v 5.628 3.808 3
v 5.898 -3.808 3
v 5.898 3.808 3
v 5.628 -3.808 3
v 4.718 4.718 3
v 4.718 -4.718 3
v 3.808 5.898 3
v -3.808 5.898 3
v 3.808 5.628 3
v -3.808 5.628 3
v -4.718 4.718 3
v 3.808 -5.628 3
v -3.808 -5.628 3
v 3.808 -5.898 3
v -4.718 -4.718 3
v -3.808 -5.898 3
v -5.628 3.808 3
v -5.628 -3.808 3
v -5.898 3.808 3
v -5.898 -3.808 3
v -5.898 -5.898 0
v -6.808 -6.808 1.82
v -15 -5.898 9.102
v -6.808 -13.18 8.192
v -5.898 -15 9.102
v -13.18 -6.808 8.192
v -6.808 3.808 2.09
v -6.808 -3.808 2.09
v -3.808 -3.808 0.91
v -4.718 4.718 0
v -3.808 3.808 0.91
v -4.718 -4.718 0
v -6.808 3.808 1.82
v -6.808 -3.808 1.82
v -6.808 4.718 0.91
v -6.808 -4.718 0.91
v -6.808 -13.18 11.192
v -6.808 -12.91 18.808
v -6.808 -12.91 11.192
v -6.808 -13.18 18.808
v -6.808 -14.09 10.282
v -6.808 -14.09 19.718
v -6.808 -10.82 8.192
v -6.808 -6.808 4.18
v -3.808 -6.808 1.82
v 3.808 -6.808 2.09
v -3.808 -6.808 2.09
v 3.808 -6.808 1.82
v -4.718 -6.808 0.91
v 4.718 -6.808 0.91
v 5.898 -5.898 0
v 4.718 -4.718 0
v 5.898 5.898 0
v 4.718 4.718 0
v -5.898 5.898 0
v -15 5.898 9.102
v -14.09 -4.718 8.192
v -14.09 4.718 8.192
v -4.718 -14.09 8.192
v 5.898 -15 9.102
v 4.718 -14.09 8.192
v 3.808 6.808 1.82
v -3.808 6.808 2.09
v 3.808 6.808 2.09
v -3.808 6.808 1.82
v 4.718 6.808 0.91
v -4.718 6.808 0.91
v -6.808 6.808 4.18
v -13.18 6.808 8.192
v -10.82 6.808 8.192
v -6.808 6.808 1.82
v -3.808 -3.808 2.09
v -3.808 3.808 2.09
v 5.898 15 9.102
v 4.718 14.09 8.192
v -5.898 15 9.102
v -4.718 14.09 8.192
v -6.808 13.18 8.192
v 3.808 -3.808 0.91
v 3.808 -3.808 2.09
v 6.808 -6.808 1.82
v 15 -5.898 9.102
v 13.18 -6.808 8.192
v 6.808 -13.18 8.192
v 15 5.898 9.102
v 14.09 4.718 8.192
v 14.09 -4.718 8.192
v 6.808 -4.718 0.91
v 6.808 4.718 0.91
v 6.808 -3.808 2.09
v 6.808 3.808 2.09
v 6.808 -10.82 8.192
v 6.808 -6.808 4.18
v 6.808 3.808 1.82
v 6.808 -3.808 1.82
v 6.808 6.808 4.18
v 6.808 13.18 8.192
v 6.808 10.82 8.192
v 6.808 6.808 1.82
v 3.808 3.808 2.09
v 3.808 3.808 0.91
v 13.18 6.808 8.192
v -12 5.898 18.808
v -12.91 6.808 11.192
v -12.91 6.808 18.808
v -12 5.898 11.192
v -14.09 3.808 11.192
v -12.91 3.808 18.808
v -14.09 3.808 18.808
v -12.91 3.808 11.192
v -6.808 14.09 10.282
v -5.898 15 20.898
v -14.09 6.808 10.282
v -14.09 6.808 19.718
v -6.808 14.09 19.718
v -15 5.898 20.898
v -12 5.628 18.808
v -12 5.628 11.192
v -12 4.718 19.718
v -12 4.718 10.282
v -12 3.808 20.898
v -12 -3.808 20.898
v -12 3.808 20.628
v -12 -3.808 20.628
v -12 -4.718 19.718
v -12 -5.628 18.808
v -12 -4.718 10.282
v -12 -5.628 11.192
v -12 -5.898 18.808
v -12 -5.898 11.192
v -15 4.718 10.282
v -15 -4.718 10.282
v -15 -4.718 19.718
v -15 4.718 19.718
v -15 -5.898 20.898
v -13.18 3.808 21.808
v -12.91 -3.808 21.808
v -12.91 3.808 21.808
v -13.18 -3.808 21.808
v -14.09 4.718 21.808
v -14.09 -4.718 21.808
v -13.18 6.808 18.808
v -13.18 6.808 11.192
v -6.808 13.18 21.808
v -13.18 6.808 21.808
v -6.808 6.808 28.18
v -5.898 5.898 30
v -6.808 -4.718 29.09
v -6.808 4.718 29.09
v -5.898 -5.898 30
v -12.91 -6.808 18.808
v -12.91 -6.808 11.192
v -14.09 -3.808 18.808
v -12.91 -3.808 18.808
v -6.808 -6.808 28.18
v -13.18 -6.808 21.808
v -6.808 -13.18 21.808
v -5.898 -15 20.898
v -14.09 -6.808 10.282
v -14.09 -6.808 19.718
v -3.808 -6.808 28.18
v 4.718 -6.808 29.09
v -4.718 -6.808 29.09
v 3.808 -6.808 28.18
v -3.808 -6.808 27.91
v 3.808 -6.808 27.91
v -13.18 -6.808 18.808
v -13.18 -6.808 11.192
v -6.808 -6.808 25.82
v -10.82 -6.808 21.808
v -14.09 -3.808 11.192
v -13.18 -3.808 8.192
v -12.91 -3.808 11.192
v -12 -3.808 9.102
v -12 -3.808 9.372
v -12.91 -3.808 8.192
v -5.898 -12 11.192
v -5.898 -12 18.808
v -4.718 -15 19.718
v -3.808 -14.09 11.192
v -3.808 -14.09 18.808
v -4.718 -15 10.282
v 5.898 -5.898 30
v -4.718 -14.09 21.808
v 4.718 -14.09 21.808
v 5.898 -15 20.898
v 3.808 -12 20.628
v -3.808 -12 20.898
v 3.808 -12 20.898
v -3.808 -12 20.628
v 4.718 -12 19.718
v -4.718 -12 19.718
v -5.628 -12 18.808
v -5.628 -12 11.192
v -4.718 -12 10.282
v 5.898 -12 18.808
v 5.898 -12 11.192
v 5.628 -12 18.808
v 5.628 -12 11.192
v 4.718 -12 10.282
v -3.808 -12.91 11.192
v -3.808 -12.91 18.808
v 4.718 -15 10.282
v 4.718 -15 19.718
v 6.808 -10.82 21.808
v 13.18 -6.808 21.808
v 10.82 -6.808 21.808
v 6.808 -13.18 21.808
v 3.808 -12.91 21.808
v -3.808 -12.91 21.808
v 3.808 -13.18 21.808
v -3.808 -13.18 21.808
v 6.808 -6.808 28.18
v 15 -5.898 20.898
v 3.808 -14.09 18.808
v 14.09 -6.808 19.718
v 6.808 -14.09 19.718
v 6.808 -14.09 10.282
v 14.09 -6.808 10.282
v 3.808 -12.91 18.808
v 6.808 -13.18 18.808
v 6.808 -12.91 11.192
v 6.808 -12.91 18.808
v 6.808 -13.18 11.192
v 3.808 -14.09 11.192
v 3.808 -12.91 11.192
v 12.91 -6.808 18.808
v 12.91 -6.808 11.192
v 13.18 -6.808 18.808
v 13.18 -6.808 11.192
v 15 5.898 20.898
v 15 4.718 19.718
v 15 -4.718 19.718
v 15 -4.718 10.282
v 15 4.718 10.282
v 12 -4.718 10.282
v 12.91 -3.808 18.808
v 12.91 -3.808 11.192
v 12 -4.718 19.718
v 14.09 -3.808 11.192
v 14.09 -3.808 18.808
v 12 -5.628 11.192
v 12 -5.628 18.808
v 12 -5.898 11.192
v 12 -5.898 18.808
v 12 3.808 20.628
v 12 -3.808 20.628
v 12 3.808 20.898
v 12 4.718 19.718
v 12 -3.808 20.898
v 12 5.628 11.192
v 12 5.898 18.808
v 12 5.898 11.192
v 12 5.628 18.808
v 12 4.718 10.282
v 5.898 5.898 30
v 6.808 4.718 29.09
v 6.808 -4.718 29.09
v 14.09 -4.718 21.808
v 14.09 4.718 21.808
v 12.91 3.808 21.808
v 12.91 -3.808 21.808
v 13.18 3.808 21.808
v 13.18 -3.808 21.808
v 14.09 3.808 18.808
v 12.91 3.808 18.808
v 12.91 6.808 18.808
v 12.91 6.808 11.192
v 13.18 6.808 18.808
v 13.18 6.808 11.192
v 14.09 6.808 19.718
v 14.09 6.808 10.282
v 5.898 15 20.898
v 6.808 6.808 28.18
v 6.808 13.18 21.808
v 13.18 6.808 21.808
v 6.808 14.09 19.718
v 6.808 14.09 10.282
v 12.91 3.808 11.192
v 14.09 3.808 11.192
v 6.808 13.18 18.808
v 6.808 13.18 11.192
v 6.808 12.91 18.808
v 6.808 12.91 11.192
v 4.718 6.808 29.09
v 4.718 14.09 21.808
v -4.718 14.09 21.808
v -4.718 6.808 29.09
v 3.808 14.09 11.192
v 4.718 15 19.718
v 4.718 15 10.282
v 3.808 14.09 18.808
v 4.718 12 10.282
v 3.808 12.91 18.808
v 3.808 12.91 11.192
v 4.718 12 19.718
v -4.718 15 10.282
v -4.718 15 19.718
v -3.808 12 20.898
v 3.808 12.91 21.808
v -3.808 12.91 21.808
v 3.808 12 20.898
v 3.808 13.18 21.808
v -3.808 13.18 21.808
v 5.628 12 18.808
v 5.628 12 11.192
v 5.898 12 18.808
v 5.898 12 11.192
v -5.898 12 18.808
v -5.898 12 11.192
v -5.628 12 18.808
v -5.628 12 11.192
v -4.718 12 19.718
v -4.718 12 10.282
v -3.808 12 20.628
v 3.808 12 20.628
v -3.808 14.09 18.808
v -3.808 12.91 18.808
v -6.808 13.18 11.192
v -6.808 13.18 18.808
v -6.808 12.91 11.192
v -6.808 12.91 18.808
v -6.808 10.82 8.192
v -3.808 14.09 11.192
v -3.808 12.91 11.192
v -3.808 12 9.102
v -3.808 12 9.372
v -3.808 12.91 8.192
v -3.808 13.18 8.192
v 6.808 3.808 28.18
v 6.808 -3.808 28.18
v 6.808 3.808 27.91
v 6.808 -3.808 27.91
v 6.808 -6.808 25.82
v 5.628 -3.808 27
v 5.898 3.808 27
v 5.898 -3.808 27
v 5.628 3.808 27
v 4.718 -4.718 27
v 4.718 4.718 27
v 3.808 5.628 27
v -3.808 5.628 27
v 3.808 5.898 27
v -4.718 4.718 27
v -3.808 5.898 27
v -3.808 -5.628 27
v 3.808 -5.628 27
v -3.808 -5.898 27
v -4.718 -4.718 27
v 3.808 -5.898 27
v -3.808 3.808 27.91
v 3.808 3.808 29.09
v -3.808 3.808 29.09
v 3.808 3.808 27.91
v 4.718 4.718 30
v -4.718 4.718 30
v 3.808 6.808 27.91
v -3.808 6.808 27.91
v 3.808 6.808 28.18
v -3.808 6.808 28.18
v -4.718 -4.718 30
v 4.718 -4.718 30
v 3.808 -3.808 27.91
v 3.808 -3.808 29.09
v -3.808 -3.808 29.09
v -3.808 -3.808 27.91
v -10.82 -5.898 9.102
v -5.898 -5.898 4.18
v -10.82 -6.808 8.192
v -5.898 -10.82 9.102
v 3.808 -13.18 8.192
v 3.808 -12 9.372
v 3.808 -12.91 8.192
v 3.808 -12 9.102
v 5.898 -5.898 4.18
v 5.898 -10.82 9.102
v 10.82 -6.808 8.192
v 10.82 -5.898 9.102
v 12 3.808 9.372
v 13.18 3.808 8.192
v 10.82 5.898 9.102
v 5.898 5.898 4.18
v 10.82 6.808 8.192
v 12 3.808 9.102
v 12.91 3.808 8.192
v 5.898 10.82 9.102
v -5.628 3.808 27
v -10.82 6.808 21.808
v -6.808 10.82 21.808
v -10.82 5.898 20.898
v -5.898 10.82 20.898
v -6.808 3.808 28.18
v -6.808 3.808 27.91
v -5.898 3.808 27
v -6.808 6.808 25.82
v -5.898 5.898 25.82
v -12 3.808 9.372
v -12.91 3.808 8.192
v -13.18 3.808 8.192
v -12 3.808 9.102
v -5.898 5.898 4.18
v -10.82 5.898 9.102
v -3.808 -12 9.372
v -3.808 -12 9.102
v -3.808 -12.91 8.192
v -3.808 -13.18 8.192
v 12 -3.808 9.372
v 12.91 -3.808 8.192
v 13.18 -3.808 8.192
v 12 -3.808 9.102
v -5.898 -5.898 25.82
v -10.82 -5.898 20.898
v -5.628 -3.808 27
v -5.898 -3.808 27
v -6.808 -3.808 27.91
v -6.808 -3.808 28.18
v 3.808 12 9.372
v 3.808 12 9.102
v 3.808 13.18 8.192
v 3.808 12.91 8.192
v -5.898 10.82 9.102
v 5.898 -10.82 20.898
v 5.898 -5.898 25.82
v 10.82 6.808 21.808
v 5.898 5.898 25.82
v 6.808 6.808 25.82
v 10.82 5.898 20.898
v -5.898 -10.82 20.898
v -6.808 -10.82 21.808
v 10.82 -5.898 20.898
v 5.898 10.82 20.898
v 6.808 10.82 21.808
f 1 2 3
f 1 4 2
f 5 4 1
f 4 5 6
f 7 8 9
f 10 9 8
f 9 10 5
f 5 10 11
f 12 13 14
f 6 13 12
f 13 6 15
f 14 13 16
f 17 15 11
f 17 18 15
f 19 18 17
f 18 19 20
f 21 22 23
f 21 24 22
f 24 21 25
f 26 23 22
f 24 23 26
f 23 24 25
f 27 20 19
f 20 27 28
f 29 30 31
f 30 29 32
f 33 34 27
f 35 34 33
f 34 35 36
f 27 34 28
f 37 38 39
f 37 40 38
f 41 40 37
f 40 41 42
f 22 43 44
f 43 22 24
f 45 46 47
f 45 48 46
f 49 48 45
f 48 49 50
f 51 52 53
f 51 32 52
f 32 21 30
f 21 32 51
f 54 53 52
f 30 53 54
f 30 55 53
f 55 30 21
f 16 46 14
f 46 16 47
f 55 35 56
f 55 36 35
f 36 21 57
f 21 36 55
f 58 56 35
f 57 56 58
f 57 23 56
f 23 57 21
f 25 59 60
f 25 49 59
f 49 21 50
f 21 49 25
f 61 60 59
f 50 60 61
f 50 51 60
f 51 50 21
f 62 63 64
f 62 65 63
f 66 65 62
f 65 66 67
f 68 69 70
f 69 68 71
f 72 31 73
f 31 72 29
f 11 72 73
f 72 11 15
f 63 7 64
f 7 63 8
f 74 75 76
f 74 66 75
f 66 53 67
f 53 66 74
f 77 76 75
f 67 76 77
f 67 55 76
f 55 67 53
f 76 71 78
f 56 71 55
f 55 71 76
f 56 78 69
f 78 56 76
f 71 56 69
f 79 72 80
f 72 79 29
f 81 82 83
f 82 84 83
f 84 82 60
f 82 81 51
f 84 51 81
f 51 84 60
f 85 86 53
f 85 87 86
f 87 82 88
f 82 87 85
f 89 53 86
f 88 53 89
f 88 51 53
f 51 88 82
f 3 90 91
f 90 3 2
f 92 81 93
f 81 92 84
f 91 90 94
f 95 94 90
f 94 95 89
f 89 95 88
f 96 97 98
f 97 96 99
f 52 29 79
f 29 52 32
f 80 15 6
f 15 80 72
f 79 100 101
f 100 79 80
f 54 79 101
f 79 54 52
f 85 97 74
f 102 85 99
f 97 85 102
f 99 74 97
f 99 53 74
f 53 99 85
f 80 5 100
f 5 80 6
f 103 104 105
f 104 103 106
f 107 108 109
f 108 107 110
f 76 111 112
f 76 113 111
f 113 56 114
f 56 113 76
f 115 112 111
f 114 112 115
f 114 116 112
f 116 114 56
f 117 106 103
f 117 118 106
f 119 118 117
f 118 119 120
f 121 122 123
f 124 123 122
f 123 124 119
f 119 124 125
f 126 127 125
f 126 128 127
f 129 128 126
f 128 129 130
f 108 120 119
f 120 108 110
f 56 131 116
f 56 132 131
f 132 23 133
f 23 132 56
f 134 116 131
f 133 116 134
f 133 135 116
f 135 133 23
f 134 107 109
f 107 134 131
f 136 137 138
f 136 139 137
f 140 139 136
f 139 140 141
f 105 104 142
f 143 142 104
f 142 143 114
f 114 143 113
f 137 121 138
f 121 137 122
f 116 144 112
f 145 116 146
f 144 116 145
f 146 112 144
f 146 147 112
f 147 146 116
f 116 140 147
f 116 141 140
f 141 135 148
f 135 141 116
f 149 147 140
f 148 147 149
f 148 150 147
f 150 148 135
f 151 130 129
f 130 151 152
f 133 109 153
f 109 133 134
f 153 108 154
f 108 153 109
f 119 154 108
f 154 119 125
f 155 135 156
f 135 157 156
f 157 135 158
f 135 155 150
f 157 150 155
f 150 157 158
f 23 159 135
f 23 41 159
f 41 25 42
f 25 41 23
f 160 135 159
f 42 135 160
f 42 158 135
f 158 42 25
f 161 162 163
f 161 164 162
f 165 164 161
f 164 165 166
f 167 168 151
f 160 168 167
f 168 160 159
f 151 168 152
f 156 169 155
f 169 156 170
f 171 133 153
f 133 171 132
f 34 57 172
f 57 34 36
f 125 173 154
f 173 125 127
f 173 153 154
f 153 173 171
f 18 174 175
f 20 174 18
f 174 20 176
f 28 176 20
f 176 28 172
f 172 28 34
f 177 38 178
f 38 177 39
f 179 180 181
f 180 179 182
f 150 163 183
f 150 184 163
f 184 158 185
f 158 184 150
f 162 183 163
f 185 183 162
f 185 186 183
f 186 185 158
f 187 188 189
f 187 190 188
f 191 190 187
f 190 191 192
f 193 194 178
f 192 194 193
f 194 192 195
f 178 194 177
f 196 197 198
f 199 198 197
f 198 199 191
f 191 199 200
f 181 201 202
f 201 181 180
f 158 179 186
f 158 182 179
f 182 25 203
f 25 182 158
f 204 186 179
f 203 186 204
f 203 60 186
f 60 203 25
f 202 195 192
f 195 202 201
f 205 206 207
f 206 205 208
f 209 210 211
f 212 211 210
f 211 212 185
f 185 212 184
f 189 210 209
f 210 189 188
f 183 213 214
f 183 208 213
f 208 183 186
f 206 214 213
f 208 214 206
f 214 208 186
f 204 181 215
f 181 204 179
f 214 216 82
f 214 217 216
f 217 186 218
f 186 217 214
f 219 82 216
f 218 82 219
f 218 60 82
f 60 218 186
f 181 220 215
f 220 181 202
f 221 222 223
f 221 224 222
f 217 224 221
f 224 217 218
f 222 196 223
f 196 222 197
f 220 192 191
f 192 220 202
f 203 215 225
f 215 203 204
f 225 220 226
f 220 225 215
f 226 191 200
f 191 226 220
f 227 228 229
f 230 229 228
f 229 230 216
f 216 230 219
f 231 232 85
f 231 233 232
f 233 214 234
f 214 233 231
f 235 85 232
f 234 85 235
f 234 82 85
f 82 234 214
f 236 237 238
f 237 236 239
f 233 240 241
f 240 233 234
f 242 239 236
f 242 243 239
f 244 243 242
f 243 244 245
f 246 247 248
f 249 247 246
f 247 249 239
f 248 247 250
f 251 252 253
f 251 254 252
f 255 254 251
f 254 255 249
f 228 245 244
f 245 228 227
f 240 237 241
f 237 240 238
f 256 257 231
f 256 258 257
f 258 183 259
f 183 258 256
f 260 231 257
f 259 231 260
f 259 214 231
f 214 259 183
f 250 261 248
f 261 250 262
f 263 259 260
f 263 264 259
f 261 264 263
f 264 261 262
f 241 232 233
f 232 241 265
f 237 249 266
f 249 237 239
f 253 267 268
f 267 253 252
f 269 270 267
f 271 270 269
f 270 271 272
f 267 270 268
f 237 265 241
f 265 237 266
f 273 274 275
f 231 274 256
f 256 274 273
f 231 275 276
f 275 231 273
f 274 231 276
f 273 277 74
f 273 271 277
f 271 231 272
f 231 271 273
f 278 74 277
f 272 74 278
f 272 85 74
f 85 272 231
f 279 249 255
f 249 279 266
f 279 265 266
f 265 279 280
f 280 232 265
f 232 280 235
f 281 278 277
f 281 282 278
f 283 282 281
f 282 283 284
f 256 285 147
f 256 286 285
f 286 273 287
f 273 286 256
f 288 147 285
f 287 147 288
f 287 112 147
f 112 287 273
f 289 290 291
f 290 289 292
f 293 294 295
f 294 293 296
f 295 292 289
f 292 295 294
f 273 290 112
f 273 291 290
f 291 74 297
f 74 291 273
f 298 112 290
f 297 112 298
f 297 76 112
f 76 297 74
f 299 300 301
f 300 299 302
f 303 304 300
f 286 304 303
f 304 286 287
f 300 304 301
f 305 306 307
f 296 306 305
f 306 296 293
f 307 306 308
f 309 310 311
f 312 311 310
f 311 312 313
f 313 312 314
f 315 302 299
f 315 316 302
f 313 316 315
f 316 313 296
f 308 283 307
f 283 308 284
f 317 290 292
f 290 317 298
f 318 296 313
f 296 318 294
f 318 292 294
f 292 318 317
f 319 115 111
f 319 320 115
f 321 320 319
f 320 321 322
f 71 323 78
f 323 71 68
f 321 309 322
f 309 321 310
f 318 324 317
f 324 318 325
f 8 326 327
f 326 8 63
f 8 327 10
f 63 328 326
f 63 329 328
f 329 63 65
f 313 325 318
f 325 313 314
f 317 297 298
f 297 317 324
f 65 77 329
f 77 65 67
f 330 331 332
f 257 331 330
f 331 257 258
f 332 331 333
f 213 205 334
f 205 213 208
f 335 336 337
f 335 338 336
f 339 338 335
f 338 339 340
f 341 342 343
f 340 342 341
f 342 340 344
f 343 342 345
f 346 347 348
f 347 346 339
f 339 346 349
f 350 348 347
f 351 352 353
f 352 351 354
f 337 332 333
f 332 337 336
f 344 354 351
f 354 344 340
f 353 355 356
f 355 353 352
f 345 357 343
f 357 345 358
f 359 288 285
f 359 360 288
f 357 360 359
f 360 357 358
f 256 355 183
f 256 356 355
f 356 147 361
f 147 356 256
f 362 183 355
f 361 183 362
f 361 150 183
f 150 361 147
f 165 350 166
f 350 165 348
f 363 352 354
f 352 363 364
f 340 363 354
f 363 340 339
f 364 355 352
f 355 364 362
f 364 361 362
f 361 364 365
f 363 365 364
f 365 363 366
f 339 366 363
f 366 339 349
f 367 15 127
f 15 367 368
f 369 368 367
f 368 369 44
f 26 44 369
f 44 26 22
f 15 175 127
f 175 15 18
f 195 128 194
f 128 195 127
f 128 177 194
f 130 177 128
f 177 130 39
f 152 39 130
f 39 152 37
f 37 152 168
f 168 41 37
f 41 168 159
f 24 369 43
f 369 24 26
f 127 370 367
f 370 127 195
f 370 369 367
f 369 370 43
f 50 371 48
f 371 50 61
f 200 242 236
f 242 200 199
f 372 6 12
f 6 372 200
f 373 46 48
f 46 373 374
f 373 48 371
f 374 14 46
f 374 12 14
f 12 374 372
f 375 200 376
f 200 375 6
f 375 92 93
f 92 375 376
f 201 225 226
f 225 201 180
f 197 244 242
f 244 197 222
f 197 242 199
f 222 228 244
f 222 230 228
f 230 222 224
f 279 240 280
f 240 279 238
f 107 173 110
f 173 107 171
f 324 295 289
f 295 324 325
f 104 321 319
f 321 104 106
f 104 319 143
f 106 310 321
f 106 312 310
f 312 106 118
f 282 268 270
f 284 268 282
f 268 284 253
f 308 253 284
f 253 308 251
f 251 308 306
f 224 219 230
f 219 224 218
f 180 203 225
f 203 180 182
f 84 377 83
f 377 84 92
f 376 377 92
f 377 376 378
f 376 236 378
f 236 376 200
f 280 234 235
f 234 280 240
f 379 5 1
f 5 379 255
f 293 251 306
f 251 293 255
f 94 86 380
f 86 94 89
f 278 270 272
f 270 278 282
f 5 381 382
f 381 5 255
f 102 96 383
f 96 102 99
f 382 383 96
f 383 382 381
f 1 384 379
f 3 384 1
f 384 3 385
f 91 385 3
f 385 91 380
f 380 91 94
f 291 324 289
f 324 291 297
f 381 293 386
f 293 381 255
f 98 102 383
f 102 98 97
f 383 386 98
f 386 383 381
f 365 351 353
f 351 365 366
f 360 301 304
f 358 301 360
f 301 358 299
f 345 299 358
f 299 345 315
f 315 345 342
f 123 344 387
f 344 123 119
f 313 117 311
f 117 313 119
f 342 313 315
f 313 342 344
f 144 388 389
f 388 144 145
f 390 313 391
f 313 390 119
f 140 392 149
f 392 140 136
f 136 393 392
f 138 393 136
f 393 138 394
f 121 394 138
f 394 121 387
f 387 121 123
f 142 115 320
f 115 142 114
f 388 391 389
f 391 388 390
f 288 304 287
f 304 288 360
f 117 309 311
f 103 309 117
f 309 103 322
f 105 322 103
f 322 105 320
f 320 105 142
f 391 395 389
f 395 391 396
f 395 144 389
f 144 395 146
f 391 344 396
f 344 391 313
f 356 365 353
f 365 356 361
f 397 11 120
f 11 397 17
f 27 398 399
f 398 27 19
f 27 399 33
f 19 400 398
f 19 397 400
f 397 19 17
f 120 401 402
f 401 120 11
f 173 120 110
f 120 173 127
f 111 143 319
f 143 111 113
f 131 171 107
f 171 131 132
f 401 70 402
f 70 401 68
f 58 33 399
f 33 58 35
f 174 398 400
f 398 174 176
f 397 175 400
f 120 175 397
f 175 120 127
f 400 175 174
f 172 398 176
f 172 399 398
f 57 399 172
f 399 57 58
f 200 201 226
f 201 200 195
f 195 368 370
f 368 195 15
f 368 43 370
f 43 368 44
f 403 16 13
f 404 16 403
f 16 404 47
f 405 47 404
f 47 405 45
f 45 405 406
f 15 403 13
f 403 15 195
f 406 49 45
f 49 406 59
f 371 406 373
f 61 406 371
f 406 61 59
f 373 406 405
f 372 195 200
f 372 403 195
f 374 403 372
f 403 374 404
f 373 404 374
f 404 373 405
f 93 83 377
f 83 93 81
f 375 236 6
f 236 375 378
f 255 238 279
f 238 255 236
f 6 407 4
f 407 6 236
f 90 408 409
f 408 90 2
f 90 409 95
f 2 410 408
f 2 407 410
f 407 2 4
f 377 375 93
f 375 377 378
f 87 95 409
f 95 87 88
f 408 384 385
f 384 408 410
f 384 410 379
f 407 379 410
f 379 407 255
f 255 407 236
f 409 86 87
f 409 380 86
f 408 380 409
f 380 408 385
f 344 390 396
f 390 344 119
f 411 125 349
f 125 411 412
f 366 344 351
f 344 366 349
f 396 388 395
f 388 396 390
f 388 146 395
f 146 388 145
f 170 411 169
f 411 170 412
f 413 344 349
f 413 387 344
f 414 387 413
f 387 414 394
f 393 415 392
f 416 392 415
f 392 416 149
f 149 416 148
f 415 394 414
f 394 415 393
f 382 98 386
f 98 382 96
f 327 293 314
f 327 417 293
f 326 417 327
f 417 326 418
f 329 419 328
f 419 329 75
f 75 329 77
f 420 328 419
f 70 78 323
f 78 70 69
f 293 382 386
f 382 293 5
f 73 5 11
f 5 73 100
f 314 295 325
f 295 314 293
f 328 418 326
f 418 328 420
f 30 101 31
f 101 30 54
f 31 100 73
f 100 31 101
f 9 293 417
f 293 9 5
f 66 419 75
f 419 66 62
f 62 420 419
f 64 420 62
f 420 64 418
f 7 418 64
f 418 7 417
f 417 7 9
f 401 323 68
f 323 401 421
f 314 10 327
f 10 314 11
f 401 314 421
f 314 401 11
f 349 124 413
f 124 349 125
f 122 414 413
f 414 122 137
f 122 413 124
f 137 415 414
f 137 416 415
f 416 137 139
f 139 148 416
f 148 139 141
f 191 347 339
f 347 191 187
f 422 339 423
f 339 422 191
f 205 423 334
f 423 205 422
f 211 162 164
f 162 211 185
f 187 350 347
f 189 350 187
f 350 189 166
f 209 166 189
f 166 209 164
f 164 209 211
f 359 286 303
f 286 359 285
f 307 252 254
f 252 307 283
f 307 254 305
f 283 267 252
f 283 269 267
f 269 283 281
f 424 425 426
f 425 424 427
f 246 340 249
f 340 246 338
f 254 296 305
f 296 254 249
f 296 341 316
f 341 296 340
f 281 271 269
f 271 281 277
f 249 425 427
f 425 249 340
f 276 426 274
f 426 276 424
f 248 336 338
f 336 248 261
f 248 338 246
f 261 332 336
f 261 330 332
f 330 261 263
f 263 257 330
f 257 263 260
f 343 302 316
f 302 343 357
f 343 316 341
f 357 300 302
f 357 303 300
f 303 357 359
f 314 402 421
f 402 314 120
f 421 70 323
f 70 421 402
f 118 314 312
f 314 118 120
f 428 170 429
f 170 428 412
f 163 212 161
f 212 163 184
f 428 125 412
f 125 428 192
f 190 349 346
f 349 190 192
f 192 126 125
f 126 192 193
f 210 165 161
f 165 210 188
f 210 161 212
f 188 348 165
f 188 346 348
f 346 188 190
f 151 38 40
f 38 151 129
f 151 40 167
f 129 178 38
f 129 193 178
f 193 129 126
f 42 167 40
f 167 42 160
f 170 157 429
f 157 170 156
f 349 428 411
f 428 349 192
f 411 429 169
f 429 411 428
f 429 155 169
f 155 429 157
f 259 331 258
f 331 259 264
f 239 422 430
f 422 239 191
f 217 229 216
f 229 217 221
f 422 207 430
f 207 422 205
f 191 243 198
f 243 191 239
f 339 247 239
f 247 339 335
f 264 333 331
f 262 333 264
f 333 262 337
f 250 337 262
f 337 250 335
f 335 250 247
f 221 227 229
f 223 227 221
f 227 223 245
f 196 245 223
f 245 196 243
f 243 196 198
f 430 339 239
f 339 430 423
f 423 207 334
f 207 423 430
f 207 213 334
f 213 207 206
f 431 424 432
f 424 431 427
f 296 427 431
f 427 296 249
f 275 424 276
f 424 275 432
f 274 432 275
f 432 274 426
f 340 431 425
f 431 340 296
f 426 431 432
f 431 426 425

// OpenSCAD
// shape height
sh = 30;
// border width
bw = 3;

include <../polyhedra.scad>;

poly_wire(rhombicuboctahedron);
